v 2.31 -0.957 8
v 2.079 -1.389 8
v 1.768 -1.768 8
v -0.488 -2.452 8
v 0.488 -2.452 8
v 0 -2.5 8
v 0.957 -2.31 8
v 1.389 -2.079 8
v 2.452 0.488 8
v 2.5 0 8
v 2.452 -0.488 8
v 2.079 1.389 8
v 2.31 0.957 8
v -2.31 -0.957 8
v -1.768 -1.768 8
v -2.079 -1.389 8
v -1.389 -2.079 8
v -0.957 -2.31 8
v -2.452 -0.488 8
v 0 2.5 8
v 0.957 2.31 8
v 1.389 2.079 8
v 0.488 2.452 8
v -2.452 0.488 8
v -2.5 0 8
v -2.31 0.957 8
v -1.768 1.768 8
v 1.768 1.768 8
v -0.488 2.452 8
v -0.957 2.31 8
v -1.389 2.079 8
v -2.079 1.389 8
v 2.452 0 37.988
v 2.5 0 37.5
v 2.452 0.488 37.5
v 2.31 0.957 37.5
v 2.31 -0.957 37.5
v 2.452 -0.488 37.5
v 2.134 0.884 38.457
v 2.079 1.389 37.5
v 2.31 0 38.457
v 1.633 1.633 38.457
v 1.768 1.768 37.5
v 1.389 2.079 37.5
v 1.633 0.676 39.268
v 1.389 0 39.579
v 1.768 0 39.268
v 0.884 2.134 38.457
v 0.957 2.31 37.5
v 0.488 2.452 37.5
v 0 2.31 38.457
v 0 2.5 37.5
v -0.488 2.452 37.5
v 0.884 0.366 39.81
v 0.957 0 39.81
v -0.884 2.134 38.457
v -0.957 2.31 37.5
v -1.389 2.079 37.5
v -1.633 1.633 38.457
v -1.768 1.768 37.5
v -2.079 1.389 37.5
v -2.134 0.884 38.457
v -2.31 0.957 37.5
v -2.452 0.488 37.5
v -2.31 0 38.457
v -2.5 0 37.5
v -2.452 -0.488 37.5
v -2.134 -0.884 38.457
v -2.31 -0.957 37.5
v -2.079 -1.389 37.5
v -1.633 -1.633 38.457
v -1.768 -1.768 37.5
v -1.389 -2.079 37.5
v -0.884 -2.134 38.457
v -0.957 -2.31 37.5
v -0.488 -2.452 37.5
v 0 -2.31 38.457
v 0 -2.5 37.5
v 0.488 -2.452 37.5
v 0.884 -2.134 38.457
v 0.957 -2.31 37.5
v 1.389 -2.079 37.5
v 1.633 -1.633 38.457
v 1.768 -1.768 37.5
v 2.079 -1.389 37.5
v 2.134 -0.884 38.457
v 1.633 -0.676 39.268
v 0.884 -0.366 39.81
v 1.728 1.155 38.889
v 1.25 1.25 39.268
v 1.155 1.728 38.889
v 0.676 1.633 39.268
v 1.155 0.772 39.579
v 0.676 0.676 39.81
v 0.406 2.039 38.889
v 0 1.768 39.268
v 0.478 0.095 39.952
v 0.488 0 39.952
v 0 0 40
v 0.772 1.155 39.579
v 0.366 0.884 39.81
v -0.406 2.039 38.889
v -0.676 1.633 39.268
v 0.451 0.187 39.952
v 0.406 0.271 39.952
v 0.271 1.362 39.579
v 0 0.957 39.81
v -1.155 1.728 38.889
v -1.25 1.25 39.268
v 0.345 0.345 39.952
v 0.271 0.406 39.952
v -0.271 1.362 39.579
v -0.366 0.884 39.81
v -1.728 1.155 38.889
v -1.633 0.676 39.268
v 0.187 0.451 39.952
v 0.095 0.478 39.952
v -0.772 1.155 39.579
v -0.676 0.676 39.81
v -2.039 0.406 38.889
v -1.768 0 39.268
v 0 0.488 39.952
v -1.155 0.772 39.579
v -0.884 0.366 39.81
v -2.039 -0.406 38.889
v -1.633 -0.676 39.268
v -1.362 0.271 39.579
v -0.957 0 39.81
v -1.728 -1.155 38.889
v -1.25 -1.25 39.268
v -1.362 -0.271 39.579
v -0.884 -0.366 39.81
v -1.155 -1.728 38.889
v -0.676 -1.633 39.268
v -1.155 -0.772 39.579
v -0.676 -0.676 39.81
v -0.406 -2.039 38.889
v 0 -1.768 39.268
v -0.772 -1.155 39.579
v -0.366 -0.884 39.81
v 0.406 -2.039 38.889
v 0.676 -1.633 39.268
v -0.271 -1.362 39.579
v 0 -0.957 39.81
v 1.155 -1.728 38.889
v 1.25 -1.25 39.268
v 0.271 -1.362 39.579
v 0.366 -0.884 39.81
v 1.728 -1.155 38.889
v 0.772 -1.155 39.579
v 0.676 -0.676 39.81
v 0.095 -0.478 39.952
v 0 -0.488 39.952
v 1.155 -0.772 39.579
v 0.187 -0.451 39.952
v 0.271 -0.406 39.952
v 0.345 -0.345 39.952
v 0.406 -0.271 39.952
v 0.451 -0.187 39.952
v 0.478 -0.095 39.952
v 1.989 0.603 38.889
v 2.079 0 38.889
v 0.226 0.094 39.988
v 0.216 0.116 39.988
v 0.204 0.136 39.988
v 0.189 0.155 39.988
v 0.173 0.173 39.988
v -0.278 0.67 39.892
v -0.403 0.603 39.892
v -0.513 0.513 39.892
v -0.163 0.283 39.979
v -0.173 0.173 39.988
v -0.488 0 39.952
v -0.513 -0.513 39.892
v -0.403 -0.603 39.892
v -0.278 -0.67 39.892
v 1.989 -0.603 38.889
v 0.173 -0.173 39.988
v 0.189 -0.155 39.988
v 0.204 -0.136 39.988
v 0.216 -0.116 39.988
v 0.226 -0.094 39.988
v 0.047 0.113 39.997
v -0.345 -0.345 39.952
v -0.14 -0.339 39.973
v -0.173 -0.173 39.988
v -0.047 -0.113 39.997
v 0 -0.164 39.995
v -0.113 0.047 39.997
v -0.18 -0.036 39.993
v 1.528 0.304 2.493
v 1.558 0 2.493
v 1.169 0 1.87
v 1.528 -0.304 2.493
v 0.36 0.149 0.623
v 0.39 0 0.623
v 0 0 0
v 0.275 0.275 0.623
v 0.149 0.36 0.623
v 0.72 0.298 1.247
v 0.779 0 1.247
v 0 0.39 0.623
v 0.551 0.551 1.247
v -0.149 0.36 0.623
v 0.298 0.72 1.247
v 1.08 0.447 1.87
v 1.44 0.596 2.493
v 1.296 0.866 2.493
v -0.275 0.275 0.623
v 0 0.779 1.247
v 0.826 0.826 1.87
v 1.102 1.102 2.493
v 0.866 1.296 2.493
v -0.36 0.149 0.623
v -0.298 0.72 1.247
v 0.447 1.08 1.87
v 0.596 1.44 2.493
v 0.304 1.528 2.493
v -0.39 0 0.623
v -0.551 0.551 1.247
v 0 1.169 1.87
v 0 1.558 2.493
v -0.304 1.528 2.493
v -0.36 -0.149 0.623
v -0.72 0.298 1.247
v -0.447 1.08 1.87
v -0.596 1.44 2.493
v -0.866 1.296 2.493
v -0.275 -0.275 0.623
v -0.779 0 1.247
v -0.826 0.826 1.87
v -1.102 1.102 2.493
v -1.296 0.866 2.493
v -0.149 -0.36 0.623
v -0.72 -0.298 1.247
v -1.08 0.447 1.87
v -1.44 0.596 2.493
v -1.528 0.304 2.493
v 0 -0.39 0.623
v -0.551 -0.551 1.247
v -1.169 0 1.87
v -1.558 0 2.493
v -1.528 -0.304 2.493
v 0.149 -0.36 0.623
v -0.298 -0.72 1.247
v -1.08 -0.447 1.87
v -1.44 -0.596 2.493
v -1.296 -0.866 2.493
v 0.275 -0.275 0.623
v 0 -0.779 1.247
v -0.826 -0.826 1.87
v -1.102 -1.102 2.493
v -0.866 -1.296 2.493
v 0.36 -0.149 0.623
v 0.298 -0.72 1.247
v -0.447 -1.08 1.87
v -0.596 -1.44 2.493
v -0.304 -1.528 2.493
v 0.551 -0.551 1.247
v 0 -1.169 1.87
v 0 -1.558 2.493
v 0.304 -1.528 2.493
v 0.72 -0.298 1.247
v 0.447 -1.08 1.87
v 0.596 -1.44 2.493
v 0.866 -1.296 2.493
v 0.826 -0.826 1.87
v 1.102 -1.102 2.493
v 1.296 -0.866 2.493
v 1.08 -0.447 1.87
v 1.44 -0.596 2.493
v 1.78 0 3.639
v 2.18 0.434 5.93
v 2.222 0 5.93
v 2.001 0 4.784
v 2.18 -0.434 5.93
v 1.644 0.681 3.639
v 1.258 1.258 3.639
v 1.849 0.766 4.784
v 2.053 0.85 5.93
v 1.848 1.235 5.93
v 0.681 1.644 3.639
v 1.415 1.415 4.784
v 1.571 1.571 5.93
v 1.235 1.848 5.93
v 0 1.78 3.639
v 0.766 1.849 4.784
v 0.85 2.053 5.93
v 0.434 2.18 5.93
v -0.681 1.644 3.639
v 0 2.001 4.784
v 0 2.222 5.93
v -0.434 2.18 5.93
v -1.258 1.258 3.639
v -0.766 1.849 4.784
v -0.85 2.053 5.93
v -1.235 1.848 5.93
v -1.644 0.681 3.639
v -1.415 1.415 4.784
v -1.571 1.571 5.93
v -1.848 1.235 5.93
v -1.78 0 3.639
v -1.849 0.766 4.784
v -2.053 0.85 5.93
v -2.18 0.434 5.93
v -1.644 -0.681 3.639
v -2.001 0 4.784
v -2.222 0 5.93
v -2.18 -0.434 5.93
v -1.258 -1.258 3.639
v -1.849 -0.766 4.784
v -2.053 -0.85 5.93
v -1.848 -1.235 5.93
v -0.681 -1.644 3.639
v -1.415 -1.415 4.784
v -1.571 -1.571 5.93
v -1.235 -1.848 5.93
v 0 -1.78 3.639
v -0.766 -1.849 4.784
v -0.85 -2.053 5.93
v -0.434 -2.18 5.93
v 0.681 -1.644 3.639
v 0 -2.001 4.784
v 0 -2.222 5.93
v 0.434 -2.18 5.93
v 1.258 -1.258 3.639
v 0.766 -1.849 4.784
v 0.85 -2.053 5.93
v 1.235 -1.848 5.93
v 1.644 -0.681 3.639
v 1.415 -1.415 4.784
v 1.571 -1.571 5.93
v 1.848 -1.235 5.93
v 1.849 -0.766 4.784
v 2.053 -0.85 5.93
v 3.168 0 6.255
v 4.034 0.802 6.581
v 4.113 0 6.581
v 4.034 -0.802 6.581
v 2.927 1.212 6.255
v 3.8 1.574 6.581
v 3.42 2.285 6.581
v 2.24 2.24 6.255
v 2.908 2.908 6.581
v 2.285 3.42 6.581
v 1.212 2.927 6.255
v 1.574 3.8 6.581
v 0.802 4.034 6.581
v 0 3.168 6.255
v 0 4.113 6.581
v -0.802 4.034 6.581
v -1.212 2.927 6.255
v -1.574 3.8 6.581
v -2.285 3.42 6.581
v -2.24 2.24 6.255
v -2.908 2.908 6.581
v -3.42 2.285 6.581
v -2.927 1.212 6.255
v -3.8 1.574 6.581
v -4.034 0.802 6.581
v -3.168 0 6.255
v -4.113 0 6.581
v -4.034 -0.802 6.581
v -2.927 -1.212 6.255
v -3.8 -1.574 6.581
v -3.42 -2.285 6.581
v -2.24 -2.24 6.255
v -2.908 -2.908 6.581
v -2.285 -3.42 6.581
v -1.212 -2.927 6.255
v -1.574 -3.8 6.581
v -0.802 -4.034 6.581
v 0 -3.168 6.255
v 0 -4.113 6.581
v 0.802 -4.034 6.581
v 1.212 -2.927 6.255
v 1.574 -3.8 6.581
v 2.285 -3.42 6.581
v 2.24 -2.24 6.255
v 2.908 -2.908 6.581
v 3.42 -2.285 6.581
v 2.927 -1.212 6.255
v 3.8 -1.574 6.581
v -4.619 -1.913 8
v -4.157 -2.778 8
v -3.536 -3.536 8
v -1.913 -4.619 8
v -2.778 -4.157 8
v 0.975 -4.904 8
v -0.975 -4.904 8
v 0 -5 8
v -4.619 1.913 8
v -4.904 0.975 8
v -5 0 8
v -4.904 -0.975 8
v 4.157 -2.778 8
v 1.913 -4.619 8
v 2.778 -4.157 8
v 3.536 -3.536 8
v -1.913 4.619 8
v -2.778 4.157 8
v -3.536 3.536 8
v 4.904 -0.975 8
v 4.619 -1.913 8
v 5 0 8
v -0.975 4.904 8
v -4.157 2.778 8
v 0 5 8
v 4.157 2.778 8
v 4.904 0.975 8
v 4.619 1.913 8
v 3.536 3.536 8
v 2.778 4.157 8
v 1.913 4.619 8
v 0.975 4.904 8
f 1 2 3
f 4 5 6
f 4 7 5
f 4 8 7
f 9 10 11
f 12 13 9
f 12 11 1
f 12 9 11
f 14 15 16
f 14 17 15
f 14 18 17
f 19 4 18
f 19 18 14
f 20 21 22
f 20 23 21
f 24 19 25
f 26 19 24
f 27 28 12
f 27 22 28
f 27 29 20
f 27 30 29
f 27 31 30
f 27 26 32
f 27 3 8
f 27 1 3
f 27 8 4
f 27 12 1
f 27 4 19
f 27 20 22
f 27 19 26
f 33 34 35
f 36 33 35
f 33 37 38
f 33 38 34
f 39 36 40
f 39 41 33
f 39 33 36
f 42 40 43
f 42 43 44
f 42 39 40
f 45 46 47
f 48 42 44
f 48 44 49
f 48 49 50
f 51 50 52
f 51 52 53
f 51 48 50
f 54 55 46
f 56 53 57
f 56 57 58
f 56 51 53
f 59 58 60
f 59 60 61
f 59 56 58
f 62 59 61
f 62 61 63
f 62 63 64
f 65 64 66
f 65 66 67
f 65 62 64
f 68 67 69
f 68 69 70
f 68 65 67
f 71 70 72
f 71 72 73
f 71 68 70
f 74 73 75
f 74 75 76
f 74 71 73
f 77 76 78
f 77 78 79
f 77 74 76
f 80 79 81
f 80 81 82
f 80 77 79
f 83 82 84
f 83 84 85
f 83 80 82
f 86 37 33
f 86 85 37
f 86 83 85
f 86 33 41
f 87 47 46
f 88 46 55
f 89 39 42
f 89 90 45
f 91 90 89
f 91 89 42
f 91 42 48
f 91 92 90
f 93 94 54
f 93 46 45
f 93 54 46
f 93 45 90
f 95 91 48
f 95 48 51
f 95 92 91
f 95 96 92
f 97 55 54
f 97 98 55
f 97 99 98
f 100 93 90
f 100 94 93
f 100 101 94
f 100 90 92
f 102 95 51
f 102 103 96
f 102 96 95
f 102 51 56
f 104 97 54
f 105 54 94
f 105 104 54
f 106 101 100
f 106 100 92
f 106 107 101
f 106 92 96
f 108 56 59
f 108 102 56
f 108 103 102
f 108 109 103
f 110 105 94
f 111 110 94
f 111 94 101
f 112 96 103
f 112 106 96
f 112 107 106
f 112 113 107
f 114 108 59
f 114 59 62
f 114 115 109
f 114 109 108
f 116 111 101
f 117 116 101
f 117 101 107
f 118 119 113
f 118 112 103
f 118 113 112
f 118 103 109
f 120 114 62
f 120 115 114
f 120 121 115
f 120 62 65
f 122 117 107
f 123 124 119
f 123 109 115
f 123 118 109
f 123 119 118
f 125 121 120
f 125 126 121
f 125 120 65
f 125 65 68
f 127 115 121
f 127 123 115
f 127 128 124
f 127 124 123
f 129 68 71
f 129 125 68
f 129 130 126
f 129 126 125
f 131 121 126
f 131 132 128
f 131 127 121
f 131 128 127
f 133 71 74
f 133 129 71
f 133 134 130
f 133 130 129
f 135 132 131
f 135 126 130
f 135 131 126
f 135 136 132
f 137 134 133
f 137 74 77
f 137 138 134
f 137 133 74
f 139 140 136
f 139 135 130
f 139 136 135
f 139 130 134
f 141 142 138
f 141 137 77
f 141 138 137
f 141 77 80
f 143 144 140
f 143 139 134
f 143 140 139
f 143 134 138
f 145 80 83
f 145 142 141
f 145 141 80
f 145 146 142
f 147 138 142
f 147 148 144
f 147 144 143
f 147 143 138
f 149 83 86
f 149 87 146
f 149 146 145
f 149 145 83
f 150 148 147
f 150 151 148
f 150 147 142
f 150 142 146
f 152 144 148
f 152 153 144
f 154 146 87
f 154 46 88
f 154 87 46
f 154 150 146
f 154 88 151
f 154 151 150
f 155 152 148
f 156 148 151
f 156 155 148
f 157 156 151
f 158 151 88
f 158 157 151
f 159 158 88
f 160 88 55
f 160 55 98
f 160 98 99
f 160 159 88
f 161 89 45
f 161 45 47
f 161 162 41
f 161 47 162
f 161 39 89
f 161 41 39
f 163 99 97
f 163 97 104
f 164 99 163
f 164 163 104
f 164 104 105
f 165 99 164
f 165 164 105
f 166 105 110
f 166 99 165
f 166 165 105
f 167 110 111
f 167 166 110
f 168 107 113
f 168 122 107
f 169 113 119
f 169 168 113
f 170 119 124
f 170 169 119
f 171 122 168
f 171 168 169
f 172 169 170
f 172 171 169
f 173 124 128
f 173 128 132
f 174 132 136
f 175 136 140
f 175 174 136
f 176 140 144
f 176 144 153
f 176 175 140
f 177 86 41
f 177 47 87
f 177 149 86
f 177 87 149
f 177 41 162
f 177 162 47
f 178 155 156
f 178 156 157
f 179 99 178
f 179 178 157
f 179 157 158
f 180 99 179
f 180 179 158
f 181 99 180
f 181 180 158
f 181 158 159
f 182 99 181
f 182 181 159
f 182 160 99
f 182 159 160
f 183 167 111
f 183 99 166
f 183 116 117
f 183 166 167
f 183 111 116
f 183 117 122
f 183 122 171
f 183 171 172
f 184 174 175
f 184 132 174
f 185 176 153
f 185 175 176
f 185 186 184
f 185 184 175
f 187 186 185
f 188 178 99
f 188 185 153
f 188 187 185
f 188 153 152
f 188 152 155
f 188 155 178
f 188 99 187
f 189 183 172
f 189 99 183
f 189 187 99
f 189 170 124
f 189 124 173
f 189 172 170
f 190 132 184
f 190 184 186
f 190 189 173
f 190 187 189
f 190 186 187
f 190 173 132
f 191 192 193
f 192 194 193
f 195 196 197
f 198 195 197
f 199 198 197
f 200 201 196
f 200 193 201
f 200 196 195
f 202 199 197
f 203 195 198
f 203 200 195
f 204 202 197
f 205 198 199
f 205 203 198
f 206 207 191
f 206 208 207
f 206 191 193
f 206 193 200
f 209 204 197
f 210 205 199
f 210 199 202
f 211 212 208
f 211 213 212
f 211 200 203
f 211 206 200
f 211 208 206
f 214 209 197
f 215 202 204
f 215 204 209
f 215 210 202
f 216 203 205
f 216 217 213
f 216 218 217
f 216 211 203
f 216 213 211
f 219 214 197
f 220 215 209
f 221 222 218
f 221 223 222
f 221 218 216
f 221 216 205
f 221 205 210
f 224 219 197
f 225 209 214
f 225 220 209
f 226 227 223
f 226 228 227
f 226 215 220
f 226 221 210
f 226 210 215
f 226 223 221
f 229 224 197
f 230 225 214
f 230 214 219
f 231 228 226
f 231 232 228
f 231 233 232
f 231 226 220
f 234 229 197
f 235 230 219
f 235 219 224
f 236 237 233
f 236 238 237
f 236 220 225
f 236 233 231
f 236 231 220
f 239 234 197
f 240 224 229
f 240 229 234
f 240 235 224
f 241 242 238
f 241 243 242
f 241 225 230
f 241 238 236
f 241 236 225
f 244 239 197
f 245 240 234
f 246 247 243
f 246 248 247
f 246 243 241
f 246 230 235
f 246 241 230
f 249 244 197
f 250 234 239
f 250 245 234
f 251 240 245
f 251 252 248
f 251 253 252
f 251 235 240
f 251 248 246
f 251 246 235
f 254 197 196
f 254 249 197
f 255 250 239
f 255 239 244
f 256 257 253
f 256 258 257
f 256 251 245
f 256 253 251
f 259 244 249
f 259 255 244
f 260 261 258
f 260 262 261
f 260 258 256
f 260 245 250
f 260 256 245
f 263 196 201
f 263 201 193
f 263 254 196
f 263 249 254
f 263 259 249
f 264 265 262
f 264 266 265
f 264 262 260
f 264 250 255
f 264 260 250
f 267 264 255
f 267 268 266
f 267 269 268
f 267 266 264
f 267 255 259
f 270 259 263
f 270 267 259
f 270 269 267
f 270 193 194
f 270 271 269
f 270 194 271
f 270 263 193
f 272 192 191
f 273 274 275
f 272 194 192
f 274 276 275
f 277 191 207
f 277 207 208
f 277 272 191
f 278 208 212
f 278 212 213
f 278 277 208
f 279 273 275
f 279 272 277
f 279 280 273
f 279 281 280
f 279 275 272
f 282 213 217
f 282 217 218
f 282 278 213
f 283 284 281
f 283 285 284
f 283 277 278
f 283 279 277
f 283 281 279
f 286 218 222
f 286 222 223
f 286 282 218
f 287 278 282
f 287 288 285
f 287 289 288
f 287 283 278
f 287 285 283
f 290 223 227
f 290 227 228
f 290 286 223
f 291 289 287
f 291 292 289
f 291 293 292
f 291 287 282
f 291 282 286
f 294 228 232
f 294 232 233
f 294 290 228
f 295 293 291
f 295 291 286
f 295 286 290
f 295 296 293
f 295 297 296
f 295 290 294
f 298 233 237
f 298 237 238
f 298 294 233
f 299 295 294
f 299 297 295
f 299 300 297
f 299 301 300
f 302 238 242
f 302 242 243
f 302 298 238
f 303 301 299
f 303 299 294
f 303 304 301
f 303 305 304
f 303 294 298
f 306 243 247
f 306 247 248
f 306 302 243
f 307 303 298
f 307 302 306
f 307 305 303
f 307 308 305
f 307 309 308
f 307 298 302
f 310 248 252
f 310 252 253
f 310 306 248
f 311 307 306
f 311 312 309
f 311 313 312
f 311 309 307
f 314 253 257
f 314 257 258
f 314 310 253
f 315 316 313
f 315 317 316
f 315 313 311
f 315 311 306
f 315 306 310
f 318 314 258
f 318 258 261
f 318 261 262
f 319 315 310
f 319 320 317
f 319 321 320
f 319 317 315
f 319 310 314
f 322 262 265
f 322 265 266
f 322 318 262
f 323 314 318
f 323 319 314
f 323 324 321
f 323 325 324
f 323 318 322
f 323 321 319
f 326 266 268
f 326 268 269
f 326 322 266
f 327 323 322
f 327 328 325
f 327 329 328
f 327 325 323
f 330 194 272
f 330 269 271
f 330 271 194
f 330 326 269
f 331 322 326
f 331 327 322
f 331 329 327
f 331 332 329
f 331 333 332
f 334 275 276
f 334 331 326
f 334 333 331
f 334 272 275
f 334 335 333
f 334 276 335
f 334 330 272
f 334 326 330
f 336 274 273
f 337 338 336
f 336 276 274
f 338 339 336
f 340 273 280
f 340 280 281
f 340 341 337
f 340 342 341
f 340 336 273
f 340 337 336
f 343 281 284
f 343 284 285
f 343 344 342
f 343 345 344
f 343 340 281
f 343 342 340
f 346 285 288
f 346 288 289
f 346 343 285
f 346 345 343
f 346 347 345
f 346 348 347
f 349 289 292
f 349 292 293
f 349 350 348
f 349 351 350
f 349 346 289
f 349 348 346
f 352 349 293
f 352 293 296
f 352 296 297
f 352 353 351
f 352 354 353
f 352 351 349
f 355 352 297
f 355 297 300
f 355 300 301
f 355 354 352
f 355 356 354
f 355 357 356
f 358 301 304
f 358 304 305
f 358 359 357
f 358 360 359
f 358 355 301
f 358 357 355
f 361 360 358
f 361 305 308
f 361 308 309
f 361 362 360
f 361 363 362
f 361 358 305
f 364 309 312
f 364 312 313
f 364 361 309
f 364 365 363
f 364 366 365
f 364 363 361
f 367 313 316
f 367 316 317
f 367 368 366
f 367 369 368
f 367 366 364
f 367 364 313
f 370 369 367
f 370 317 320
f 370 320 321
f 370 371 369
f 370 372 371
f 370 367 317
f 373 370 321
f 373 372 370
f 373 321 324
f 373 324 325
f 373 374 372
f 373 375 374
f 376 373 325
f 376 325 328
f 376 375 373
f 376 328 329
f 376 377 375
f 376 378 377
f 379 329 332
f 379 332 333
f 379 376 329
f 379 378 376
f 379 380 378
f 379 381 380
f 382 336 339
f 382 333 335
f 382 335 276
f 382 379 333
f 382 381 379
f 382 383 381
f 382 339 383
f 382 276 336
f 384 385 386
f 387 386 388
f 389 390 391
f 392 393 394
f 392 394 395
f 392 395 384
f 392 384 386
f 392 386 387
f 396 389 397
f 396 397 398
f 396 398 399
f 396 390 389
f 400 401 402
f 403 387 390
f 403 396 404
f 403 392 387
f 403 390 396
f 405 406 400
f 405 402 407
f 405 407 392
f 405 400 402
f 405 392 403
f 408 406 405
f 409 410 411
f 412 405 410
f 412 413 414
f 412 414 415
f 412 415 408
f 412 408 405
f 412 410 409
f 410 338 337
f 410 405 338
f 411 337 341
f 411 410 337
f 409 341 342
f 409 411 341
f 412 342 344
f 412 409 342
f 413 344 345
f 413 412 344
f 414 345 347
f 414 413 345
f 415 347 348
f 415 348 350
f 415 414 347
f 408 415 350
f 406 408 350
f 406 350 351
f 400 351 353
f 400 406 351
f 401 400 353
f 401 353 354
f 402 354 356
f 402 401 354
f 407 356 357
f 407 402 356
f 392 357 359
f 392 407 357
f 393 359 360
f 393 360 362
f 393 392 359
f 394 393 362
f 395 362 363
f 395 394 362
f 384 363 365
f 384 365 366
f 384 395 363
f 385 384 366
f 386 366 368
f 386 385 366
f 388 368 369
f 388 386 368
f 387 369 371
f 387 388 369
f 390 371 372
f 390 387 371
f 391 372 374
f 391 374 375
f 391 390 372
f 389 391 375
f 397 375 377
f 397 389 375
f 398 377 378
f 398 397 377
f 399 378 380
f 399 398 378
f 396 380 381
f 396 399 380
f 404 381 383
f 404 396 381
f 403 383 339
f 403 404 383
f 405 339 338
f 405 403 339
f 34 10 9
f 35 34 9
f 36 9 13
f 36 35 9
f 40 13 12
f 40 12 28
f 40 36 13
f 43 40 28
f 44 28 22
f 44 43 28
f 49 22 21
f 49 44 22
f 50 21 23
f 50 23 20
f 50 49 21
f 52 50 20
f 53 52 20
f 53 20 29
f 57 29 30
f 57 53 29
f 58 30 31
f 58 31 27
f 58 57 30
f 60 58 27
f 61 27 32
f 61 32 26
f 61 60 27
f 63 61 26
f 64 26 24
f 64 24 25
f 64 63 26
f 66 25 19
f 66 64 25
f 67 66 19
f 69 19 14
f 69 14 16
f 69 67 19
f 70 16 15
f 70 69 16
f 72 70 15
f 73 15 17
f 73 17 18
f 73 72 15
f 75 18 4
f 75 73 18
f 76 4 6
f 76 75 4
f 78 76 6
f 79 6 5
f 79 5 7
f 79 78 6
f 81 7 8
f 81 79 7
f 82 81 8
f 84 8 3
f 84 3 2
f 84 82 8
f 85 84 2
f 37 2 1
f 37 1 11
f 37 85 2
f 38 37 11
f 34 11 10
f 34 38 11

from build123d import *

# Parameters (mm, degrees)
F0_W = 2.5
F0_H = 29.5


with BuildPart() as f1:
    # F0 (on Front) → F1 (revolve)
    with BuildSketch(Plane.XZ):
        with Locations((1.25, 22.75)):
            Rectangle(F0_W, F0_H)
        with BuildLine():
            Line((0, 40), (0, 37.5))
            Line((0, 37.5), (2.5, 37.5))
            ThreePointArc((2.5, 37.5), (1.767767, 39.267767), (0, 40))
        make_face()
    revolve(axis=Axis((0, 0, 20), (0, 0, 1)))


with BuildPart() as f2:
    # F0 (on Front) → F2 (revolve)
    with BuildSketch(Plane.XZ):
        Polygon((0, 8), (0, 0), (1.558243, 2.493189), (2.222301, 5.929615), (4.113207, 6.581132), (5, 8), (2.5, 8), align=None)
    revolve(axis=Axis((0, 0, 20), (0, 0, 1)))


solid = Compound([f1.part, f2.part])
